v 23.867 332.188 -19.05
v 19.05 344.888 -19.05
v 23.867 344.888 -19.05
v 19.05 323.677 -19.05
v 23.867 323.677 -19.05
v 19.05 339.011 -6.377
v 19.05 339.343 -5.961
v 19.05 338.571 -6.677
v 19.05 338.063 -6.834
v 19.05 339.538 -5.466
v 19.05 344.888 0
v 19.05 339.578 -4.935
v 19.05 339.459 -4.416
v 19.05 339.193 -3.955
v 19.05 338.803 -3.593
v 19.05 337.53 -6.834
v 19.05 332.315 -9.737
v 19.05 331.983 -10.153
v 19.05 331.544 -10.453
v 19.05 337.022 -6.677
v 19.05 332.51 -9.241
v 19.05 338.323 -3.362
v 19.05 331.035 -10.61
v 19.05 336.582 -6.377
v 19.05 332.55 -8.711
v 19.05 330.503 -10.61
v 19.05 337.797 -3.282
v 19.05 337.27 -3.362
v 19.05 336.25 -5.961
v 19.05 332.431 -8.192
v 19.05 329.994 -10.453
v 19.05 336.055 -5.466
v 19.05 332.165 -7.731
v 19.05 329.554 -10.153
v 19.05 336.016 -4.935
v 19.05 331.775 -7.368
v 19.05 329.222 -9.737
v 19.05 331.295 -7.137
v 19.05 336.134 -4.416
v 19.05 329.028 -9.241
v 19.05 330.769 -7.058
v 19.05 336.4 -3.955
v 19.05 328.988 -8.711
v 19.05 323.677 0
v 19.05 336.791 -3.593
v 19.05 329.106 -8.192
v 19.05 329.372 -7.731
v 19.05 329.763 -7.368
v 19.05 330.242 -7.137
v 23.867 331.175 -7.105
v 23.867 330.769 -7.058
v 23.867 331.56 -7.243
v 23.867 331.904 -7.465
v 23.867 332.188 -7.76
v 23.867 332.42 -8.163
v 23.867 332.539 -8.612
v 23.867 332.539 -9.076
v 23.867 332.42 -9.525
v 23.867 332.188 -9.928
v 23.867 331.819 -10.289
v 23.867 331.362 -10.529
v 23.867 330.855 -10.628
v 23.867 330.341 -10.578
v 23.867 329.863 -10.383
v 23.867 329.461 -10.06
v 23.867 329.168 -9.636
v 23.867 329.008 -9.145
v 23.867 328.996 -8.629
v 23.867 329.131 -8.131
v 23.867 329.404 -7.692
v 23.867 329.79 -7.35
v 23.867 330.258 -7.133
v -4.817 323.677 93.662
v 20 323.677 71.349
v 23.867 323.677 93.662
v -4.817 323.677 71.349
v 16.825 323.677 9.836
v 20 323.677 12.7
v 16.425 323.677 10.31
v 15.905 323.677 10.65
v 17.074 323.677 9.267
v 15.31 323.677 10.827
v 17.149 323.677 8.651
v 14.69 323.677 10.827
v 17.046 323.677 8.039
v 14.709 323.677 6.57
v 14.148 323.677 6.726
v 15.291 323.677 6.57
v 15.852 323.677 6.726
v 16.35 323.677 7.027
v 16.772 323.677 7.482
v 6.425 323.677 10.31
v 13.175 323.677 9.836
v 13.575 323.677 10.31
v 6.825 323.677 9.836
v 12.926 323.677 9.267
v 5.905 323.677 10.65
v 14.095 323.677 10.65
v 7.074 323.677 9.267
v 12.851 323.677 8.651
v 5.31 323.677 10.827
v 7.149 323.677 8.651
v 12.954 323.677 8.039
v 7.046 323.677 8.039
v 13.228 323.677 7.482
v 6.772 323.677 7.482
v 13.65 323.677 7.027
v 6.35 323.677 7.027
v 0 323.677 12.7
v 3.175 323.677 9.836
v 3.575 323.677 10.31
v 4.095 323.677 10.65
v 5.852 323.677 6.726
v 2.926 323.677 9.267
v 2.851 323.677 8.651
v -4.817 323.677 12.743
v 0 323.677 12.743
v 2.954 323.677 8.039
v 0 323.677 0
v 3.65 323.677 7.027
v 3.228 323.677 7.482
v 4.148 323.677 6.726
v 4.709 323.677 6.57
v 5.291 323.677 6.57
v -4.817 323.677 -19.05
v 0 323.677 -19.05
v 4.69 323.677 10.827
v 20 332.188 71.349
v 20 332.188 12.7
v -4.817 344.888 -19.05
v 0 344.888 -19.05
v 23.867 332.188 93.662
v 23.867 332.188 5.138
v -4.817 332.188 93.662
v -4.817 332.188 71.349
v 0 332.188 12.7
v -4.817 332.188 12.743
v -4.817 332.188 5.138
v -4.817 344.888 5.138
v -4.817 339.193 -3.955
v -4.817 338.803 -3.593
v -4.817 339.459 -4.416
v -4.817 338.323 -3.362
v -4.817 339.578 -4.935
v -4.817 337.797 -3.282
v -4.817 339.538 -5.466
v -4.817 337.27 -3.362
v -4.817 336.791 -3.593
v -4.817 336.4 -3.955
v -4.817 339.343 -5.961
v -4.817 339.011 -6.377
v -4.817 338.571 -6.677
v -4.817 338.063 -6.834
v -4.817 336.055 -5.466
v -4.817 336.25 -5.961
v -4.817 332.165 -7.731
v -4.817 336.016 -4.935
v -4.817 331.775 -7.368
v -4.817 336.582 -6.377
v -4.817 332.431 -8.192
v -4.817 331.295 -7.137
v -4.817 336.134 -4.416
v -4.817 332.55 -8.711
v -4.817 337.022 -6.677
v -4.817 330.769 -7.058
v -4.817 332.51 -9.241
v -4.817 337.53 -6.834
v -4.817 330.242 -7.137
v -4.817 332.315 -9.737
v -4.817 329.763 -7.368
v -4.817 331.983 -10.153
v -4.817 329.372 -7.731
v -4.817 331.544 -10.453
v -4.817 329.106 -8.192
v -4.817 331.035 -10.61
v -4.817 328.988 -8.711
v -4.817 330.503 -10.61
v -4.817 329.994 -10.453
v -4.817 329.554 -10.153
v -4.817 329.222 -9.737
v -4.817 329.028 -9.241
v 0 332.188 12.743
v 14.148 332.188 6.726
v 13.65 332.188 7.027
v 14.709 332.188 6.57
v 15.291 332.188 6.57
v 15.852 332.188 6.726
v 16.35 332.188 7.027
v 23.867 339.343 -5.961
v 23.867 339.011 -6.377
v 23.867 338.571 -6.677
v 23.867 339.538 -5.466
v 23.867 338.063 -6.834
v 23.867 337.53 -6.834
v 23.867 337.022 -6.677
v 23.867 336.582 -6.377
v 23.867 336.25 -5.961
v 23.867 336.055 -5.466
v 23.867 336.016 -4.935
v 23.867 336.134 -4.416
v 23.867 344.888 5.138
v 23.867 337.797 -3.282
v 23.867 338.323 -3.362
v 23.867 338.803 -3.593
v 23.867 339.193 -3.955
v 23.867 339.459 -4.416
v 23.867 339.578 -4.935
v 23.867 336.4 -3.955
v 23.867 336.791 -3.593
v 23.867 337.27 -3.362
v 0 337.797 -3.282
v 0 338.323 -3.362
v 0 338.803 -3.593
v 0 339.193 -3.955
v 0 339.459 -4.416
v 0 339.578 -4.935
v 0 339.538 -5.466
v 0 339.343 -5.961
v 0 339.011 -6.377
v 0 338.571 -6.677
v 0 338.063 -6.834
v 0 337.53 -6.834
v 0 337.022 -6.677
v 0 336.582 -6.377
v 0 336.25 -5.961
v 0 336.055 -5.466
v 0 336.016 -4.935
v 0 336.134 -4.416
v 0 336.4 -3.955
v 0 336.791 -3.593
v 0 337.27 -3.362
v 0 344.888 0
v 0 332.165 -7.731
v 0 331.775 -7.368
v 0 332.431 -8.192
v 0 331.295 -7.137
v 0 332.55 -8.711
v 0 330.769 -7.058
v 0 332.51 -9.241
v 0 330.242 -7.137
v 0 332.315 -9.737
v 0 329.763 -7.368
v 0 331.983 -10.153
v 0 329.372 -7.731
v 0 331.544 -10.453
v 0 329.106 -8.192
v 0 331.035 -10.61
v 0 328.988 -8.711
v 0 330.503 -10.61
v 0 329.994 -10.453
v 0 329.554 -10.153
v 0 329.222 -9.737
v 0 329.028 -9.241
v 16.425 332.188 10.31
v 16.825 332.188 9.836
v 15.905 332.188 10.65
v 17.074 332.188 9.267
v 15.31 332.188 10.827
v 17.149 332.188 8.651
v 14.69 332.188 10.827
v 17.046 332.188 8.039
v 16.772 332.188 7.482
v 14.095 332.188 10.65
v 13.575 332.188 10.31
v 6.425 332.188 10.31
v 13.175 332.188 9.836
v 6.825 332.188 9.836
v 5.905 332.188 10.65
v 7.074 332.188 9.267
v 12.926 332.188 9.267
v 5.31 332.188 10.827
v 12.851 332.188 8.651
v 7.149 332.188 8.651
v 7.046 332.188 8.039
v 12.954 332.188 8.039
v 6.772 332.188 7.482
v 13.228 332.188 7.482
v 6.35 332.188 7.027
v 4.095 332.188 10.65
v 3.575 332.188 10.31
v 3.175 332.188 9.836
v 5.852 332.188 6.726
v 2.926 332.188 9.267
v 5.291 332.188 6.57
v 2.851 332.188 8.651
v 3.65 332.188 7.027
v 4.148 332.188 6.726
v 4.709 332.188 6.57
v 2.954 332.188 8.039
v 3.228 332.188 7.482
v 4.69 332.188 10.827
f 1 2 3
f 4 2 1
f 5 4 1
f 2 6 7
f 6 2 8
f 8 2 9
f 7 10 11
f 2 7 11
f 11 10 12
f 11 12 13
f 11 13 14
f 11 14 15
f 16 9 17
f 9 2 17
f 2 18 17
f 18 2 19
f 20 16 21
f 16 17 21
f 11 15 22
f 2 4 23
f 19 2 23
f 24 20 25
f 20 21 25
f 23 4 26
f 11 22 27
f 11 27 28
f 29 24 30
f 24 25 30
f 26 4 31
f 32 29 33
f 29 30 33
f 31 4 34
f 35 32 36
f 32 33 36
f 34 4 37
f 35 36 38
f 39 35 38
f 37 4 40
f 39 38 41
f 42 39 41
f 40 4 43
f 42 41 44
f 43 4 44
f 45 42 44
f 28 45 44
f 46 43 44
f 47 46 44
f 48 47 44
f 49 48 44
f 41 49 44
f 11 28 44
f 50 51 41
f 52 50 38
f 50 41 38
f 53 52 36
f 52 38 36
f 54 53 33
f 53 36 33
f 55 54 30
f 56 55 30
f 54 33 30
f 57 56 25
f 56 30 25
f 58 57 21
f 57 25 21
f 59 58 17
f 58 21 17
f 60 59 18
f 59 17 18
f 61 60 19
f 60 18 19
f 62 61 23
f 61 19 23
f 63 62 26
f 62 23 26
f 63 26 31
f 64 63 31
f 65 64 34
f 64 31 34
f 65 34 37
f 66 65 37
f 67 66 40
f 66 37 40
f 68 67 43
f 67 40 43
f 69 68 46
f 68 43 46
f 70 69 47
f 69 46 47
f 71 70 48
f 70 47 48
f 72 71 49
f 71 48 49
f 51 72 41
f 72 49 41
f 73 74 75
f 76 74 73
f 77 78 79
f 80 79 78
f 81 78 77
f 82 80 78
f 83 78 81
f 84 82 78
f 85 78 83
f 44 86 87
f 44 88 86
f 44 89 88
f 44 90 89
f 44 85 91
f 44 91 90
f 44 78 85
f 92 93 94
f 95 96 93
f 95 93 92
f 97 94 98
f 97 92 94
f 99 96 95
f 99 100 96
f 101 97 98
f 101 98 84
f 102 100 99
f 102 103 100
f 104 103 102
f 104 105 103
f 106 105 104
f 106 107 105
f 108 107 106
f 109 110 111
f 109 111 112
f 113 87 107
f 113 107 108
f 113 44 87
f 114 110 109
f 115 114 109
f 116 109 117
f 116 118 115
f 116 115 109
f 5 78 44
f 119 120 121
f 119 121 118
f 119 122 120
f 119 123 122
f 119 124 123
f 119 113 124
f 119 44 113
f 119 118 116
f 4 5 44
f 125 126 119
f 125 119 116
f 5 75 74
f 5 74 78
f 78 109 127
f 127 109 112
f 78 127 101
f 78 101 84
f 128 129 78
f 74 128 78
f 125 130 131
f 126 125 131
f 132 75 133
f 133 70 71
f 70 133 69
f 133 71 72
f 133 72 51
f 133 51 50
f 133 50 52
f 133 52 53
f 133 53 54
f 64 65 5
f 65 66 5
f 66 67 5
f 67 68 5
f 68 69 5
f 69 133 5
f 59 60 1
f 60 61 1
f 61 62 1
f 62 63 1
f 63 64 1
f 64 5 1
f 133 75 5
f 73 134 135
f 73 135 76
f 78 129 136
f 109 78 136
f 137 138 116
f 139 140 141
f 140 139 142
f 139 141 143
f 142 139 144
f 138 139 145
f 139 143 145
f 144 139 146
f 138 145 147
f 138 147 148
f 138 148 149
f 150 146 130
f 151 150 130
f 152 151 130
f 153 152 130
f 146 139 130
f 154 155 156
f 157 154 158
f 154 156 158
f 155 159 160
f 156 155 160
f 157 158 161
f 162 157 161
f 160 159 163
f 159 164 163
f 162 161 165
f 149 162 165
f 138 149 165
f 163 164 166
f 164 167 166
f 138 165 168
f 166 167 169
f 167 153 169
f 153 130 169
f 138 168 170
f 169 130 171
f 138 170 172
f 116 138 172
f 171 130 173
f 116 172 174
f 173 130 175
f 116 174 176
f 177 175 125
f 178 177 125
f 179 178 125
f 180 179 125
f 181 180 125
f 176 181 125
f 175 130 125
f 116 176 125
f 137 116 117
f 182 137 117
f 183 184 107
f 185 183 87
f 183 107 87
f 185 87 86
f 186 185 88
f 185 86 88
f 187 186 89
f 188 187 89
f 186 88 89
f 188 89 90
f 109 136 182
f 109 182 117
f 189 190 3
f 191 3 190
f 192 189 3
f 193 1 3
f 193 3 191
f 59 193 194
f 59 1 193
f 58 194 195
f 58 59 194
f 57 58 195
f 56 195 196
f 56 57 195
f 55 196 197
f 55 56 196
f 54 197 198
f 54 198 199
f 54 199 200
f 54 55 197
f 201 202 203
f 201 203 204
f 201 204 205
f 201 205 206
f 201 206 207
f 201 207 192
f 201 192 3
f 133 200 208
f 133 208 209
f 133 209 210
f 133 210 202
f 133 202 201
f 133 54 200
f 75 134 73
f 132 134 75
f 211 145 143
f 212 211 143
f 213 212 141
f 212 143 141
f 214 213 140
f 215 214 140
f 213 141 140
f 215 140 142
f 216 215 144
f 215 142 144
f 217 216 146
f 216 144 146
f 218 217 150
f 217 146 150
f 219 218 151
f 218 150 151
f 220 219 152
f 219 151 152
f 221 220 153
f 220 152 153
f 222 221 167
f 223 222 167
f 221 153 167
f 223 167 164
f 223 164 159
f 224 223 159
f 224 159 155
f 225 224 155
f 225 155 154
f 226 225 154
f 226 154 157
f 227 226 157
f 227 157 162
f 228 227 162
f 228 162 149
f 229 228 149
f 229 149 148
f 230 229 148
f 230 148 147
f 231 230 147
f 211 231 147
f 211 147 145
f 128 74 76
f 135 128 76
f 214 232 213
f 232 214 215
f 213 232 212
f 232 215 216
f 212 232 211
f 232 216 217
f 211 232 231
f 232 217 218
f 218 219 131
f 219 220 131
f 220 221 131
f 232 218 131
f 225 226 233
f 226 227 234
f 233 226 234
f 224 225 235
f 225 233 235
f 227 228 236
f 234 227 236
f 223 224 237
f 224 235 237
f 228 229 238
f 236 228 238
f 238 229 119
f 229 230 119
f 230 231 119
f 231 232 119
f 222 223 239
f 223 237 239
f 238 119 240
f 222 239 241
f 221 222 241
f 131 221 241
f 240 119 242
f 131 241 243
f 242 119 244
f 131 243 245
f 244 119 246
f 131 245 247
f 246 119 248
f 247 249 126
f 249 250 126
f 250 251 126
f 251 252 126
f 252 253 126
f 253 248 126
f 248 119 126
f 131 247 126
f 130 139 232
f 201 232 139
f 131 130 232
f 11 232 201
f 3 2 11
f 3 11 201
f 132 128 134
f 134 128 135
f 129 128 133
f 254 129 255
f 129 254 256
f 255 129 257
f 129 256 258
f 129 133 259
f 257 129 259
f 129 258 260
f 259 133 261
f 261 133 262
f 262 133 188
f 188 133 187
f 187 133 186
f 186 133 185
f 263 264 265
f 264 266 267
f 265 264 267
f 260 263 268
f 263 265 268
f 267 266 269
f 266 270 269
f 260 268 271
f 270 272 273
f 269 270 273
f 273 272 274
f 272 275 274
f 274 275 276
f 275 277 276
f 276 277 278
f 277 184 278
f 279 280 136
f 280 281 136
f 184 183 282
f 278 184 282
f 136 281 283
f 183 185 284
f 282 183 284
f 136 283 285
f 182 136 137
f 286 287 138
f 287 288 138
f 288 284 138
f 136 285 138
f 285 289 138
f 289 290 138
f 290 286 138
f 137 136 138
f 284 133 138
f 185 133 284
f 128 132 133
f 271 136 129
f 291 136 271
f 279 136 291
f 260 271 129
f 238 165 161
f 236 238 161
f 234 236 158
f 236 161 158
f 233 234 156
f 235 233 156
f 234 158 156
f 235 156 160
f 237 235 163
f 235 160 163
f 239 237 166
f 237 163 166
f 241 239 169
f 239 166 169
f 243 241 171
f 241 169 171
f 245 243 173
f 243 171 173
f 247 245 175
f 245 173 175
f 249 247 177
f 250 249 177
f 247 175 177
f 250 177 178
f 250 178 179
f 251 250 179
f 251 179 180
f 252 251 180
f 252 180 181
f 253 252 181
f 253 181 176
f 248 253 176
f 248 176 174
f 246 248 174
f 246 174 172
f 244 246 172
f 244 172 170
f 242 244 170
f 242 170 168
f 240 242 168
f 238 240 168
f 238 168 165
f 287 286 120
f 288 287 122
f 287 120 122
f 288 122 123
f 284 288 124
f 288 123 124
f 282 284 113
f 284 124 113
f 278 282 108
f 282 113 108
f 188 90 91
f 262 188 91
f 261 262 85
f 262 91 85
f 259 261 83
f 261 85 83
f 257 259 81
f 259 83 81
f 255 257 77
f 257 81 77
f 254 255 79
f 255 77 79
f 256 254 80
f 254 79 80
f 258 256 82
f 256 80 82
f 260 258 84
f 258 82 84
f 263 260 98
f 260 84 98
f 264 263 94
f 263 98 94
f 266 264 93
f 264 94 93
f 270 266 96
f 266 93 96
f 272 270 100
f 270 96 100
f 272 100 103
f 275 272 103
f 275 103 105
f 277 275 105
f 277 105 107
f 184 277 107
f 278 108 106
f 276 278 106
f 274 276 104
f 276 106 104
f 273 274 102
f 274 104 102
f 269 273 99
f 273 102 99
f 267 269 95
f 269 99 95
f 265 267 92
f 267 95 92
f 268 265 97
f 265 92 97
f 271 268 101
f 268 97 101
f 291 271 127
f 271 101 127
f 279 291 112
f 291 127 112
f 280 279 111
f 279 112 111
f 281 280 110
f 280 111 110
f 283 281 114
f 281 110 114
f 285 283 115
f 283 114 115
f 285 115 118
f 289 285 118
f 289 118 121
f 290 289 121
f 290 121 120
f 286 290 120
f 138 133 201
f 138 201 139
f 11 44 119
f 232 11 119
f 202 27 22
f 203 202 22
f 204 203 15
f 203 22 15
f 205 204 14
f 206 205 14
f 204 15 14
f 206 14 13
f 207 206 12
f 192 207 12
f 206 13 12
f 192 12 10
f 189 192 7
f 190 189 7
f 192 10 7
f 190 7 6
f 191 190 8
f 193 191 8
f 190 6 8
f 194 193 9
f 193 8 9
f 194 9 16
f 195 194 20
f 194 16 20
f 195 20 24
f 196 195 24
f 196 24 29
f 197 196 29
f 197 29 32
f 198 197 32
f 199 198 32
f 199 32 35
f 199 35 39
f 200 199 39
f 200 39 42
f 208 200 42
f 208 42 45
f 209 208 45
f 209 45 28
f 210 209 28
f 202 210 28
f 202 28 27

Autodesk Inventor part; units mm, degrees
ref_plane "YZ Plane" through (0, 0, 0) normal (1, 0, 0) x (0, 1, 0)
ref_plane "Work Plane1" through (0, 0, 0) normal (0, 0, 1) x (1, 0, 0)
ref_plane "Work Plane2" through (0, 0, 0) normal (0, 0, 1) x (1, 0, 0)
sketch "Sketch2" plane through (0, 0, 0) normal (0, 0, 1) x (1, 0, 0)
  line L0 (0, 0) -> (19.05, 0) projected
  line L1 (19.05, 0) -> (19.05, 431.8) construction
  line L2 (0, 431.8) -> (19.05, 431.8) projected
  line L3 (0, 0) -> (0, 431.8) construction
  line L4 (18.5, 323.6774) -> (1.5, 323.6774) projected
  line L5 (18.5, 323.6774) -> (19.1476, 323.6774)
  line L6 (1.5, 323.6774) -> (0, 323.6774)
  line L7 (-4.8174, 323.6774) -> (23.8674, 323.6774)
  line L8 (23.8674, 323.6774) -> (23.8674, 332.1879)
  line L9 (23.8674, 332.1879) -> (-4.8174, 332.1879)
  line L10 (-4.8174, 332.1879) -> (-4.8174, 323.6774)
  line L11 (9.525, 431.8) -> (9.525, 312.4258) construction
  line L12 (9.525, 327.9326) -> (-4.8174, 327.9326) construction
  line L13 (23.8674, 327.9326) -> (9.525, 327.9326) construction
extrude "Extrusion1" add sketch "Sketch2" along normal blind 61.9125
sketch "Sketch3" plane through (-4.8174, 323.6774, 0) normal (0, -1, 0) x (1, 0, 0)
  arc A0 (8.4674, 58.3733) -> (11.1674, 58.3733) centre (9.8174, 56.7) ccw projected
  arc A1 (18.4674, 58.3733) -> (21.1674, 58.3733) centre (19.8174, 56.7) ccw projected
  arc A2 (11.1674, 7.0267) -> (8.4674, 7.0267) centre (9.8174, 8.7) ccw projected
  arc A3 (21.1674, 7.0267) -> (18.4674, 7.0267) centre (19.8174, 8.7) ccw projected
  circle A4 centre (9.8174, 8.7) radius 2.15
  circle A5 centre (19.8174, 8.7) radius 2.15
  circle A6 centre (9.8174, 56.7) radius 2.15
  circle A7 centre (19.8174, 56.7) radius 2.15
  point P0 (4.8174, 0)
extrude "Extrusion2" cut sketch "Sketch3" against normal through all
sketch "Sketch4" plane through (-4.8174, 332.1879, 0) normal (0, 1, 0) x (1, 0, 0)
  line L0 (4.8174, -14.2) -> (4.8174, -51.2) projected
  line L1 (6.3174, -52.7) -> (23.3174, -52.7) projected
  line L2 (24.8174, -51.2) -> (24.8174, -14.2) projected
  line L3 (23.3174, -12.7) -> (6.3174, -12.7) projected
  line L4 (4.8174, -52.7) -> (24.8174, -52.7)
  line L5 (24.8174, -52.7) -> (24.8174, -12.7)
  line L6 (24.8174, -12.7) -> (4.8174, -12.7)
  line L7 (4.8174, -12.7) -> (4.8174, -52.7)
  point P0 (4.8174, 0)
extrude "Extrusion3" cut sketch "Sketch4" against normal through all
sketch "Sketch6" plane through (0, 0, 0) normal (0, 0, -1) x (-1, 0, 0)
  line L0 (4.8174, 323.6774) -> (-23.8674, 323.6774) projected
  line L1 (4.8174, 332.1879) -> (4.8174, 323.6774) projected
  line L2 (-23.8674, 332.1879) -> (4.8174, 332.1879) projected
  line L3 (-23.8674, 323.6774) -> (-23.8674, 332.1879) projected
  point P0 (0, 0)
extrude "Extrusion4" add sketch "Sketch6" along normal blind 19.05
sketch "Sketch7" plane through (-4.8174, 332.1879, 61.9125) normal (0, 1, 0) x (1, 0, 0)
  line L0 (4.8174, 70.6755) -> (4.8174, 80.9625) projected
  line L1 (4.8174, 61.9125) -> (4.8174, 70.6755) projected
  line L2 (23.8674, 61.9125) -> (23.8674, 70.6755) projected
  line L3 (23.8674, 71.4375) -> (23.8674, 80.9625) projected
  line L4 (23.8674, 61.9125) -> (4.8174, 61.9125)
  line L5 (4.8174, 61.9125) -> (4.8174, 80.9625)
  line L6 (4.8174, 80.9625) -> (23.8674, 80.9625)
  line L7 (23.8674, 80.9625) -> (23.8674, 61.9125)
extrude "Extrusion5" cut sketch "Sketch7" against normal through all
sketch "Sketch8" plane through (-4.8174, 332.1879, 61.9125) normal (0, 1, 0) x (1, 0, 0)
  line L0 (28.6847, 80.9625) -> (28.6847, 0) projected
  line L1 (0, 80.9625) -> (0, 0) projected
  line L2 (4.8174, 61.9125) -> (4.8174, 80.9625) projected
  line L3 (0, 80.9625) -> (4.8174, 80.9625) projected
  line L4 (0, 80.9625) -> (0, 0) projected
  line L5 (28.6847, 0) -> (0, 0) projected
  line L6 (28.6847, 80.9625) -> (28.6847, 0) projected
  line L7 (23.8674, 80.9625) -> (28.6847, 80.9625) projected
  line L8 (23.8674, 80.9625) -> (23.8674, 61.9125) projected
  line L9 (23.8674, 61.9125) -> (4.8174, 61.9125) projected
  line L10 (24.8174, 49.2125) -> (24.8174, 9.2125) projected
  line L11 (24.8174, 9.2125) -> (4.8174, 9.2125) projected
  line L12 (4.8174, 9.2125) -> (4.8174, 49.2125) projected
  line L13 (4.8174, 49.2125) -> (24.8174, 49.2125) projected
  circle A0 centre (9.8174, 5.2125) radius 2.15 projected
  circle A1 centre (9.8174, 53.2125) radius 2.15 projected
  circle A2 centre (19.8174, 53.2125) radius 2.15 projected
  circle A3 centre (19.8174, 5.2125) radius 2.15 projected
  line L14 (28.6847, 56.7746) -> (0, 56.7746)
  line L15 (28.6847, 56.7746) -> (57.3695, 56.7746) construction
  point P0 (4.8174, 61.9125)
  dimension "d10" = 180
extrude "Extrusion6" add sketch "Sketch8" along normal blind 12.7 contours L0 L14 L1 L3 L2 L9 L8 L7
sketch "Sketch10" plane through (23.8674, 323.6774, 61.9125) normal (1, 0, 0) x (0, 0, -1)
  point P0 (61.9125, -323.6774)
sketch "Sketch11" plane through (-4.8174, 323.6774, 61.9125) normal (-1, 0, 0) x (0, 0, 1)
  line L0 (0, 0) -> (-80.9625, 0) projected
  line L1 (0, 8.5105) -> (0, 0) projected
  line L2 (-56.7746, 8.5105) -> (0, 8.5105) projected
  line L3 (-56.7746, 8.5105) -> (-56.7746, 21.2105) projected
  line L4 (-80.9625, 21.2105) -> (-56.7746, 21.2105) projected
  line L5 (-80.9625, 0) -> (-80.9625, 21.2105) projected
  circle A0 centre (-66.9806, 14.1192) radius 1.7859
  circle A1 centre (-70.7565, 7.0913) radius 1.7859
  line L6 (-66.9806, 14.1192) -> (-66.9806, 21.2105) construction
  line L7 (-70.7565, 7.0913) -> (-70.7565, 0) construction
  line L8 (-80.9625, 0) -> (0, 0) construction
  line L9 (-70.7565, 7.0913) -> (-80.9625, 7.0913) construction
  line L10 (-80.9625, 0) -> (-80.9625, 21.2105) construction
  line L11 (-66.9806, 14.1192) -> (-56.7746, 14.1192) construction
  point P0 (-61.9125, -323.6774)
  dimension "d13" = 3.5719
  dimension "d14" = 3.5719
extrude "Extrusion7" cut sketch "Sketch11" against normal through all contours A0 | A1
sketch "Sketch12" plane through (-4.8174, 332.1879, 61.9125) normal (0, 1, 0) x (1, 0, 0)
  point P0 (4.8174, 61.9125)
move faces "Move1" translate (0, 0, 31.75) faces at (4.7442, 329.3511, 61.9125)
delete faces "Delete1" heal yes whole lump no faces at (6.978, 329.3511, 57.5427) (17.143, 329.3511, 56.527)
move faces "Move2" translate (0, 0, 18.6486) faces at (6.6667, 329.3511, 52.7)
sketch "Sketch13" plane through (-4.8174, 323.6774, 93.6625) normal (0, -1, 0) x (1, 0, 0)
  line L0 (0, -88.5246) -> (0, 0) projected
  line L1 (4.8174, -22.3139) -> (0, -22.3139)
  line L2 (0, -22.3139) -> (0, -80.9198)
  line L3 (0, -80.9198) -> (4.8174, -80.9198)
  line L4 (4.8174, -80.9198) -> (4.8174, -22.3139)
  point P0 (4.8174, -93.6625)
extrude "Extrusion8" cut sketch "Sketch13" against normal through all
sketch "Sketch14" plane through (-4.8174, 323.6774, 93.6625) normal (0, -1, 0) x (1, 0, 0)
  line L0 (9.8174, -84.9625) -> (9.8174, -14.9173) construction
  line L1 (19.8174, -84.9625) -> (19.8174, -14.9173) construction
  circle A0 centre (19.8174, -84.9625) radius 2.15 projected
  circle A1 centre (19.8174, -84.9625) radius 2.15
  circle A2 centre (19.8174, -14.9173) radius 1.7859
  circle A3 centre (9.8174, -14.9173) radius 1.7859
  circle A4 centre (19.8174, -84.9625) radius 1.7859
  circle A5 centre (9.8174, -84.9625) radius 1.7859
  point P0 (4.8174, -93.6625)
  dimension "d29" = 3.5719
  dimension "d30" = 3.5719
  dimension "d31" = 3.5719
  dimension "d32" = 3.5719
properties part number "servo mount"
